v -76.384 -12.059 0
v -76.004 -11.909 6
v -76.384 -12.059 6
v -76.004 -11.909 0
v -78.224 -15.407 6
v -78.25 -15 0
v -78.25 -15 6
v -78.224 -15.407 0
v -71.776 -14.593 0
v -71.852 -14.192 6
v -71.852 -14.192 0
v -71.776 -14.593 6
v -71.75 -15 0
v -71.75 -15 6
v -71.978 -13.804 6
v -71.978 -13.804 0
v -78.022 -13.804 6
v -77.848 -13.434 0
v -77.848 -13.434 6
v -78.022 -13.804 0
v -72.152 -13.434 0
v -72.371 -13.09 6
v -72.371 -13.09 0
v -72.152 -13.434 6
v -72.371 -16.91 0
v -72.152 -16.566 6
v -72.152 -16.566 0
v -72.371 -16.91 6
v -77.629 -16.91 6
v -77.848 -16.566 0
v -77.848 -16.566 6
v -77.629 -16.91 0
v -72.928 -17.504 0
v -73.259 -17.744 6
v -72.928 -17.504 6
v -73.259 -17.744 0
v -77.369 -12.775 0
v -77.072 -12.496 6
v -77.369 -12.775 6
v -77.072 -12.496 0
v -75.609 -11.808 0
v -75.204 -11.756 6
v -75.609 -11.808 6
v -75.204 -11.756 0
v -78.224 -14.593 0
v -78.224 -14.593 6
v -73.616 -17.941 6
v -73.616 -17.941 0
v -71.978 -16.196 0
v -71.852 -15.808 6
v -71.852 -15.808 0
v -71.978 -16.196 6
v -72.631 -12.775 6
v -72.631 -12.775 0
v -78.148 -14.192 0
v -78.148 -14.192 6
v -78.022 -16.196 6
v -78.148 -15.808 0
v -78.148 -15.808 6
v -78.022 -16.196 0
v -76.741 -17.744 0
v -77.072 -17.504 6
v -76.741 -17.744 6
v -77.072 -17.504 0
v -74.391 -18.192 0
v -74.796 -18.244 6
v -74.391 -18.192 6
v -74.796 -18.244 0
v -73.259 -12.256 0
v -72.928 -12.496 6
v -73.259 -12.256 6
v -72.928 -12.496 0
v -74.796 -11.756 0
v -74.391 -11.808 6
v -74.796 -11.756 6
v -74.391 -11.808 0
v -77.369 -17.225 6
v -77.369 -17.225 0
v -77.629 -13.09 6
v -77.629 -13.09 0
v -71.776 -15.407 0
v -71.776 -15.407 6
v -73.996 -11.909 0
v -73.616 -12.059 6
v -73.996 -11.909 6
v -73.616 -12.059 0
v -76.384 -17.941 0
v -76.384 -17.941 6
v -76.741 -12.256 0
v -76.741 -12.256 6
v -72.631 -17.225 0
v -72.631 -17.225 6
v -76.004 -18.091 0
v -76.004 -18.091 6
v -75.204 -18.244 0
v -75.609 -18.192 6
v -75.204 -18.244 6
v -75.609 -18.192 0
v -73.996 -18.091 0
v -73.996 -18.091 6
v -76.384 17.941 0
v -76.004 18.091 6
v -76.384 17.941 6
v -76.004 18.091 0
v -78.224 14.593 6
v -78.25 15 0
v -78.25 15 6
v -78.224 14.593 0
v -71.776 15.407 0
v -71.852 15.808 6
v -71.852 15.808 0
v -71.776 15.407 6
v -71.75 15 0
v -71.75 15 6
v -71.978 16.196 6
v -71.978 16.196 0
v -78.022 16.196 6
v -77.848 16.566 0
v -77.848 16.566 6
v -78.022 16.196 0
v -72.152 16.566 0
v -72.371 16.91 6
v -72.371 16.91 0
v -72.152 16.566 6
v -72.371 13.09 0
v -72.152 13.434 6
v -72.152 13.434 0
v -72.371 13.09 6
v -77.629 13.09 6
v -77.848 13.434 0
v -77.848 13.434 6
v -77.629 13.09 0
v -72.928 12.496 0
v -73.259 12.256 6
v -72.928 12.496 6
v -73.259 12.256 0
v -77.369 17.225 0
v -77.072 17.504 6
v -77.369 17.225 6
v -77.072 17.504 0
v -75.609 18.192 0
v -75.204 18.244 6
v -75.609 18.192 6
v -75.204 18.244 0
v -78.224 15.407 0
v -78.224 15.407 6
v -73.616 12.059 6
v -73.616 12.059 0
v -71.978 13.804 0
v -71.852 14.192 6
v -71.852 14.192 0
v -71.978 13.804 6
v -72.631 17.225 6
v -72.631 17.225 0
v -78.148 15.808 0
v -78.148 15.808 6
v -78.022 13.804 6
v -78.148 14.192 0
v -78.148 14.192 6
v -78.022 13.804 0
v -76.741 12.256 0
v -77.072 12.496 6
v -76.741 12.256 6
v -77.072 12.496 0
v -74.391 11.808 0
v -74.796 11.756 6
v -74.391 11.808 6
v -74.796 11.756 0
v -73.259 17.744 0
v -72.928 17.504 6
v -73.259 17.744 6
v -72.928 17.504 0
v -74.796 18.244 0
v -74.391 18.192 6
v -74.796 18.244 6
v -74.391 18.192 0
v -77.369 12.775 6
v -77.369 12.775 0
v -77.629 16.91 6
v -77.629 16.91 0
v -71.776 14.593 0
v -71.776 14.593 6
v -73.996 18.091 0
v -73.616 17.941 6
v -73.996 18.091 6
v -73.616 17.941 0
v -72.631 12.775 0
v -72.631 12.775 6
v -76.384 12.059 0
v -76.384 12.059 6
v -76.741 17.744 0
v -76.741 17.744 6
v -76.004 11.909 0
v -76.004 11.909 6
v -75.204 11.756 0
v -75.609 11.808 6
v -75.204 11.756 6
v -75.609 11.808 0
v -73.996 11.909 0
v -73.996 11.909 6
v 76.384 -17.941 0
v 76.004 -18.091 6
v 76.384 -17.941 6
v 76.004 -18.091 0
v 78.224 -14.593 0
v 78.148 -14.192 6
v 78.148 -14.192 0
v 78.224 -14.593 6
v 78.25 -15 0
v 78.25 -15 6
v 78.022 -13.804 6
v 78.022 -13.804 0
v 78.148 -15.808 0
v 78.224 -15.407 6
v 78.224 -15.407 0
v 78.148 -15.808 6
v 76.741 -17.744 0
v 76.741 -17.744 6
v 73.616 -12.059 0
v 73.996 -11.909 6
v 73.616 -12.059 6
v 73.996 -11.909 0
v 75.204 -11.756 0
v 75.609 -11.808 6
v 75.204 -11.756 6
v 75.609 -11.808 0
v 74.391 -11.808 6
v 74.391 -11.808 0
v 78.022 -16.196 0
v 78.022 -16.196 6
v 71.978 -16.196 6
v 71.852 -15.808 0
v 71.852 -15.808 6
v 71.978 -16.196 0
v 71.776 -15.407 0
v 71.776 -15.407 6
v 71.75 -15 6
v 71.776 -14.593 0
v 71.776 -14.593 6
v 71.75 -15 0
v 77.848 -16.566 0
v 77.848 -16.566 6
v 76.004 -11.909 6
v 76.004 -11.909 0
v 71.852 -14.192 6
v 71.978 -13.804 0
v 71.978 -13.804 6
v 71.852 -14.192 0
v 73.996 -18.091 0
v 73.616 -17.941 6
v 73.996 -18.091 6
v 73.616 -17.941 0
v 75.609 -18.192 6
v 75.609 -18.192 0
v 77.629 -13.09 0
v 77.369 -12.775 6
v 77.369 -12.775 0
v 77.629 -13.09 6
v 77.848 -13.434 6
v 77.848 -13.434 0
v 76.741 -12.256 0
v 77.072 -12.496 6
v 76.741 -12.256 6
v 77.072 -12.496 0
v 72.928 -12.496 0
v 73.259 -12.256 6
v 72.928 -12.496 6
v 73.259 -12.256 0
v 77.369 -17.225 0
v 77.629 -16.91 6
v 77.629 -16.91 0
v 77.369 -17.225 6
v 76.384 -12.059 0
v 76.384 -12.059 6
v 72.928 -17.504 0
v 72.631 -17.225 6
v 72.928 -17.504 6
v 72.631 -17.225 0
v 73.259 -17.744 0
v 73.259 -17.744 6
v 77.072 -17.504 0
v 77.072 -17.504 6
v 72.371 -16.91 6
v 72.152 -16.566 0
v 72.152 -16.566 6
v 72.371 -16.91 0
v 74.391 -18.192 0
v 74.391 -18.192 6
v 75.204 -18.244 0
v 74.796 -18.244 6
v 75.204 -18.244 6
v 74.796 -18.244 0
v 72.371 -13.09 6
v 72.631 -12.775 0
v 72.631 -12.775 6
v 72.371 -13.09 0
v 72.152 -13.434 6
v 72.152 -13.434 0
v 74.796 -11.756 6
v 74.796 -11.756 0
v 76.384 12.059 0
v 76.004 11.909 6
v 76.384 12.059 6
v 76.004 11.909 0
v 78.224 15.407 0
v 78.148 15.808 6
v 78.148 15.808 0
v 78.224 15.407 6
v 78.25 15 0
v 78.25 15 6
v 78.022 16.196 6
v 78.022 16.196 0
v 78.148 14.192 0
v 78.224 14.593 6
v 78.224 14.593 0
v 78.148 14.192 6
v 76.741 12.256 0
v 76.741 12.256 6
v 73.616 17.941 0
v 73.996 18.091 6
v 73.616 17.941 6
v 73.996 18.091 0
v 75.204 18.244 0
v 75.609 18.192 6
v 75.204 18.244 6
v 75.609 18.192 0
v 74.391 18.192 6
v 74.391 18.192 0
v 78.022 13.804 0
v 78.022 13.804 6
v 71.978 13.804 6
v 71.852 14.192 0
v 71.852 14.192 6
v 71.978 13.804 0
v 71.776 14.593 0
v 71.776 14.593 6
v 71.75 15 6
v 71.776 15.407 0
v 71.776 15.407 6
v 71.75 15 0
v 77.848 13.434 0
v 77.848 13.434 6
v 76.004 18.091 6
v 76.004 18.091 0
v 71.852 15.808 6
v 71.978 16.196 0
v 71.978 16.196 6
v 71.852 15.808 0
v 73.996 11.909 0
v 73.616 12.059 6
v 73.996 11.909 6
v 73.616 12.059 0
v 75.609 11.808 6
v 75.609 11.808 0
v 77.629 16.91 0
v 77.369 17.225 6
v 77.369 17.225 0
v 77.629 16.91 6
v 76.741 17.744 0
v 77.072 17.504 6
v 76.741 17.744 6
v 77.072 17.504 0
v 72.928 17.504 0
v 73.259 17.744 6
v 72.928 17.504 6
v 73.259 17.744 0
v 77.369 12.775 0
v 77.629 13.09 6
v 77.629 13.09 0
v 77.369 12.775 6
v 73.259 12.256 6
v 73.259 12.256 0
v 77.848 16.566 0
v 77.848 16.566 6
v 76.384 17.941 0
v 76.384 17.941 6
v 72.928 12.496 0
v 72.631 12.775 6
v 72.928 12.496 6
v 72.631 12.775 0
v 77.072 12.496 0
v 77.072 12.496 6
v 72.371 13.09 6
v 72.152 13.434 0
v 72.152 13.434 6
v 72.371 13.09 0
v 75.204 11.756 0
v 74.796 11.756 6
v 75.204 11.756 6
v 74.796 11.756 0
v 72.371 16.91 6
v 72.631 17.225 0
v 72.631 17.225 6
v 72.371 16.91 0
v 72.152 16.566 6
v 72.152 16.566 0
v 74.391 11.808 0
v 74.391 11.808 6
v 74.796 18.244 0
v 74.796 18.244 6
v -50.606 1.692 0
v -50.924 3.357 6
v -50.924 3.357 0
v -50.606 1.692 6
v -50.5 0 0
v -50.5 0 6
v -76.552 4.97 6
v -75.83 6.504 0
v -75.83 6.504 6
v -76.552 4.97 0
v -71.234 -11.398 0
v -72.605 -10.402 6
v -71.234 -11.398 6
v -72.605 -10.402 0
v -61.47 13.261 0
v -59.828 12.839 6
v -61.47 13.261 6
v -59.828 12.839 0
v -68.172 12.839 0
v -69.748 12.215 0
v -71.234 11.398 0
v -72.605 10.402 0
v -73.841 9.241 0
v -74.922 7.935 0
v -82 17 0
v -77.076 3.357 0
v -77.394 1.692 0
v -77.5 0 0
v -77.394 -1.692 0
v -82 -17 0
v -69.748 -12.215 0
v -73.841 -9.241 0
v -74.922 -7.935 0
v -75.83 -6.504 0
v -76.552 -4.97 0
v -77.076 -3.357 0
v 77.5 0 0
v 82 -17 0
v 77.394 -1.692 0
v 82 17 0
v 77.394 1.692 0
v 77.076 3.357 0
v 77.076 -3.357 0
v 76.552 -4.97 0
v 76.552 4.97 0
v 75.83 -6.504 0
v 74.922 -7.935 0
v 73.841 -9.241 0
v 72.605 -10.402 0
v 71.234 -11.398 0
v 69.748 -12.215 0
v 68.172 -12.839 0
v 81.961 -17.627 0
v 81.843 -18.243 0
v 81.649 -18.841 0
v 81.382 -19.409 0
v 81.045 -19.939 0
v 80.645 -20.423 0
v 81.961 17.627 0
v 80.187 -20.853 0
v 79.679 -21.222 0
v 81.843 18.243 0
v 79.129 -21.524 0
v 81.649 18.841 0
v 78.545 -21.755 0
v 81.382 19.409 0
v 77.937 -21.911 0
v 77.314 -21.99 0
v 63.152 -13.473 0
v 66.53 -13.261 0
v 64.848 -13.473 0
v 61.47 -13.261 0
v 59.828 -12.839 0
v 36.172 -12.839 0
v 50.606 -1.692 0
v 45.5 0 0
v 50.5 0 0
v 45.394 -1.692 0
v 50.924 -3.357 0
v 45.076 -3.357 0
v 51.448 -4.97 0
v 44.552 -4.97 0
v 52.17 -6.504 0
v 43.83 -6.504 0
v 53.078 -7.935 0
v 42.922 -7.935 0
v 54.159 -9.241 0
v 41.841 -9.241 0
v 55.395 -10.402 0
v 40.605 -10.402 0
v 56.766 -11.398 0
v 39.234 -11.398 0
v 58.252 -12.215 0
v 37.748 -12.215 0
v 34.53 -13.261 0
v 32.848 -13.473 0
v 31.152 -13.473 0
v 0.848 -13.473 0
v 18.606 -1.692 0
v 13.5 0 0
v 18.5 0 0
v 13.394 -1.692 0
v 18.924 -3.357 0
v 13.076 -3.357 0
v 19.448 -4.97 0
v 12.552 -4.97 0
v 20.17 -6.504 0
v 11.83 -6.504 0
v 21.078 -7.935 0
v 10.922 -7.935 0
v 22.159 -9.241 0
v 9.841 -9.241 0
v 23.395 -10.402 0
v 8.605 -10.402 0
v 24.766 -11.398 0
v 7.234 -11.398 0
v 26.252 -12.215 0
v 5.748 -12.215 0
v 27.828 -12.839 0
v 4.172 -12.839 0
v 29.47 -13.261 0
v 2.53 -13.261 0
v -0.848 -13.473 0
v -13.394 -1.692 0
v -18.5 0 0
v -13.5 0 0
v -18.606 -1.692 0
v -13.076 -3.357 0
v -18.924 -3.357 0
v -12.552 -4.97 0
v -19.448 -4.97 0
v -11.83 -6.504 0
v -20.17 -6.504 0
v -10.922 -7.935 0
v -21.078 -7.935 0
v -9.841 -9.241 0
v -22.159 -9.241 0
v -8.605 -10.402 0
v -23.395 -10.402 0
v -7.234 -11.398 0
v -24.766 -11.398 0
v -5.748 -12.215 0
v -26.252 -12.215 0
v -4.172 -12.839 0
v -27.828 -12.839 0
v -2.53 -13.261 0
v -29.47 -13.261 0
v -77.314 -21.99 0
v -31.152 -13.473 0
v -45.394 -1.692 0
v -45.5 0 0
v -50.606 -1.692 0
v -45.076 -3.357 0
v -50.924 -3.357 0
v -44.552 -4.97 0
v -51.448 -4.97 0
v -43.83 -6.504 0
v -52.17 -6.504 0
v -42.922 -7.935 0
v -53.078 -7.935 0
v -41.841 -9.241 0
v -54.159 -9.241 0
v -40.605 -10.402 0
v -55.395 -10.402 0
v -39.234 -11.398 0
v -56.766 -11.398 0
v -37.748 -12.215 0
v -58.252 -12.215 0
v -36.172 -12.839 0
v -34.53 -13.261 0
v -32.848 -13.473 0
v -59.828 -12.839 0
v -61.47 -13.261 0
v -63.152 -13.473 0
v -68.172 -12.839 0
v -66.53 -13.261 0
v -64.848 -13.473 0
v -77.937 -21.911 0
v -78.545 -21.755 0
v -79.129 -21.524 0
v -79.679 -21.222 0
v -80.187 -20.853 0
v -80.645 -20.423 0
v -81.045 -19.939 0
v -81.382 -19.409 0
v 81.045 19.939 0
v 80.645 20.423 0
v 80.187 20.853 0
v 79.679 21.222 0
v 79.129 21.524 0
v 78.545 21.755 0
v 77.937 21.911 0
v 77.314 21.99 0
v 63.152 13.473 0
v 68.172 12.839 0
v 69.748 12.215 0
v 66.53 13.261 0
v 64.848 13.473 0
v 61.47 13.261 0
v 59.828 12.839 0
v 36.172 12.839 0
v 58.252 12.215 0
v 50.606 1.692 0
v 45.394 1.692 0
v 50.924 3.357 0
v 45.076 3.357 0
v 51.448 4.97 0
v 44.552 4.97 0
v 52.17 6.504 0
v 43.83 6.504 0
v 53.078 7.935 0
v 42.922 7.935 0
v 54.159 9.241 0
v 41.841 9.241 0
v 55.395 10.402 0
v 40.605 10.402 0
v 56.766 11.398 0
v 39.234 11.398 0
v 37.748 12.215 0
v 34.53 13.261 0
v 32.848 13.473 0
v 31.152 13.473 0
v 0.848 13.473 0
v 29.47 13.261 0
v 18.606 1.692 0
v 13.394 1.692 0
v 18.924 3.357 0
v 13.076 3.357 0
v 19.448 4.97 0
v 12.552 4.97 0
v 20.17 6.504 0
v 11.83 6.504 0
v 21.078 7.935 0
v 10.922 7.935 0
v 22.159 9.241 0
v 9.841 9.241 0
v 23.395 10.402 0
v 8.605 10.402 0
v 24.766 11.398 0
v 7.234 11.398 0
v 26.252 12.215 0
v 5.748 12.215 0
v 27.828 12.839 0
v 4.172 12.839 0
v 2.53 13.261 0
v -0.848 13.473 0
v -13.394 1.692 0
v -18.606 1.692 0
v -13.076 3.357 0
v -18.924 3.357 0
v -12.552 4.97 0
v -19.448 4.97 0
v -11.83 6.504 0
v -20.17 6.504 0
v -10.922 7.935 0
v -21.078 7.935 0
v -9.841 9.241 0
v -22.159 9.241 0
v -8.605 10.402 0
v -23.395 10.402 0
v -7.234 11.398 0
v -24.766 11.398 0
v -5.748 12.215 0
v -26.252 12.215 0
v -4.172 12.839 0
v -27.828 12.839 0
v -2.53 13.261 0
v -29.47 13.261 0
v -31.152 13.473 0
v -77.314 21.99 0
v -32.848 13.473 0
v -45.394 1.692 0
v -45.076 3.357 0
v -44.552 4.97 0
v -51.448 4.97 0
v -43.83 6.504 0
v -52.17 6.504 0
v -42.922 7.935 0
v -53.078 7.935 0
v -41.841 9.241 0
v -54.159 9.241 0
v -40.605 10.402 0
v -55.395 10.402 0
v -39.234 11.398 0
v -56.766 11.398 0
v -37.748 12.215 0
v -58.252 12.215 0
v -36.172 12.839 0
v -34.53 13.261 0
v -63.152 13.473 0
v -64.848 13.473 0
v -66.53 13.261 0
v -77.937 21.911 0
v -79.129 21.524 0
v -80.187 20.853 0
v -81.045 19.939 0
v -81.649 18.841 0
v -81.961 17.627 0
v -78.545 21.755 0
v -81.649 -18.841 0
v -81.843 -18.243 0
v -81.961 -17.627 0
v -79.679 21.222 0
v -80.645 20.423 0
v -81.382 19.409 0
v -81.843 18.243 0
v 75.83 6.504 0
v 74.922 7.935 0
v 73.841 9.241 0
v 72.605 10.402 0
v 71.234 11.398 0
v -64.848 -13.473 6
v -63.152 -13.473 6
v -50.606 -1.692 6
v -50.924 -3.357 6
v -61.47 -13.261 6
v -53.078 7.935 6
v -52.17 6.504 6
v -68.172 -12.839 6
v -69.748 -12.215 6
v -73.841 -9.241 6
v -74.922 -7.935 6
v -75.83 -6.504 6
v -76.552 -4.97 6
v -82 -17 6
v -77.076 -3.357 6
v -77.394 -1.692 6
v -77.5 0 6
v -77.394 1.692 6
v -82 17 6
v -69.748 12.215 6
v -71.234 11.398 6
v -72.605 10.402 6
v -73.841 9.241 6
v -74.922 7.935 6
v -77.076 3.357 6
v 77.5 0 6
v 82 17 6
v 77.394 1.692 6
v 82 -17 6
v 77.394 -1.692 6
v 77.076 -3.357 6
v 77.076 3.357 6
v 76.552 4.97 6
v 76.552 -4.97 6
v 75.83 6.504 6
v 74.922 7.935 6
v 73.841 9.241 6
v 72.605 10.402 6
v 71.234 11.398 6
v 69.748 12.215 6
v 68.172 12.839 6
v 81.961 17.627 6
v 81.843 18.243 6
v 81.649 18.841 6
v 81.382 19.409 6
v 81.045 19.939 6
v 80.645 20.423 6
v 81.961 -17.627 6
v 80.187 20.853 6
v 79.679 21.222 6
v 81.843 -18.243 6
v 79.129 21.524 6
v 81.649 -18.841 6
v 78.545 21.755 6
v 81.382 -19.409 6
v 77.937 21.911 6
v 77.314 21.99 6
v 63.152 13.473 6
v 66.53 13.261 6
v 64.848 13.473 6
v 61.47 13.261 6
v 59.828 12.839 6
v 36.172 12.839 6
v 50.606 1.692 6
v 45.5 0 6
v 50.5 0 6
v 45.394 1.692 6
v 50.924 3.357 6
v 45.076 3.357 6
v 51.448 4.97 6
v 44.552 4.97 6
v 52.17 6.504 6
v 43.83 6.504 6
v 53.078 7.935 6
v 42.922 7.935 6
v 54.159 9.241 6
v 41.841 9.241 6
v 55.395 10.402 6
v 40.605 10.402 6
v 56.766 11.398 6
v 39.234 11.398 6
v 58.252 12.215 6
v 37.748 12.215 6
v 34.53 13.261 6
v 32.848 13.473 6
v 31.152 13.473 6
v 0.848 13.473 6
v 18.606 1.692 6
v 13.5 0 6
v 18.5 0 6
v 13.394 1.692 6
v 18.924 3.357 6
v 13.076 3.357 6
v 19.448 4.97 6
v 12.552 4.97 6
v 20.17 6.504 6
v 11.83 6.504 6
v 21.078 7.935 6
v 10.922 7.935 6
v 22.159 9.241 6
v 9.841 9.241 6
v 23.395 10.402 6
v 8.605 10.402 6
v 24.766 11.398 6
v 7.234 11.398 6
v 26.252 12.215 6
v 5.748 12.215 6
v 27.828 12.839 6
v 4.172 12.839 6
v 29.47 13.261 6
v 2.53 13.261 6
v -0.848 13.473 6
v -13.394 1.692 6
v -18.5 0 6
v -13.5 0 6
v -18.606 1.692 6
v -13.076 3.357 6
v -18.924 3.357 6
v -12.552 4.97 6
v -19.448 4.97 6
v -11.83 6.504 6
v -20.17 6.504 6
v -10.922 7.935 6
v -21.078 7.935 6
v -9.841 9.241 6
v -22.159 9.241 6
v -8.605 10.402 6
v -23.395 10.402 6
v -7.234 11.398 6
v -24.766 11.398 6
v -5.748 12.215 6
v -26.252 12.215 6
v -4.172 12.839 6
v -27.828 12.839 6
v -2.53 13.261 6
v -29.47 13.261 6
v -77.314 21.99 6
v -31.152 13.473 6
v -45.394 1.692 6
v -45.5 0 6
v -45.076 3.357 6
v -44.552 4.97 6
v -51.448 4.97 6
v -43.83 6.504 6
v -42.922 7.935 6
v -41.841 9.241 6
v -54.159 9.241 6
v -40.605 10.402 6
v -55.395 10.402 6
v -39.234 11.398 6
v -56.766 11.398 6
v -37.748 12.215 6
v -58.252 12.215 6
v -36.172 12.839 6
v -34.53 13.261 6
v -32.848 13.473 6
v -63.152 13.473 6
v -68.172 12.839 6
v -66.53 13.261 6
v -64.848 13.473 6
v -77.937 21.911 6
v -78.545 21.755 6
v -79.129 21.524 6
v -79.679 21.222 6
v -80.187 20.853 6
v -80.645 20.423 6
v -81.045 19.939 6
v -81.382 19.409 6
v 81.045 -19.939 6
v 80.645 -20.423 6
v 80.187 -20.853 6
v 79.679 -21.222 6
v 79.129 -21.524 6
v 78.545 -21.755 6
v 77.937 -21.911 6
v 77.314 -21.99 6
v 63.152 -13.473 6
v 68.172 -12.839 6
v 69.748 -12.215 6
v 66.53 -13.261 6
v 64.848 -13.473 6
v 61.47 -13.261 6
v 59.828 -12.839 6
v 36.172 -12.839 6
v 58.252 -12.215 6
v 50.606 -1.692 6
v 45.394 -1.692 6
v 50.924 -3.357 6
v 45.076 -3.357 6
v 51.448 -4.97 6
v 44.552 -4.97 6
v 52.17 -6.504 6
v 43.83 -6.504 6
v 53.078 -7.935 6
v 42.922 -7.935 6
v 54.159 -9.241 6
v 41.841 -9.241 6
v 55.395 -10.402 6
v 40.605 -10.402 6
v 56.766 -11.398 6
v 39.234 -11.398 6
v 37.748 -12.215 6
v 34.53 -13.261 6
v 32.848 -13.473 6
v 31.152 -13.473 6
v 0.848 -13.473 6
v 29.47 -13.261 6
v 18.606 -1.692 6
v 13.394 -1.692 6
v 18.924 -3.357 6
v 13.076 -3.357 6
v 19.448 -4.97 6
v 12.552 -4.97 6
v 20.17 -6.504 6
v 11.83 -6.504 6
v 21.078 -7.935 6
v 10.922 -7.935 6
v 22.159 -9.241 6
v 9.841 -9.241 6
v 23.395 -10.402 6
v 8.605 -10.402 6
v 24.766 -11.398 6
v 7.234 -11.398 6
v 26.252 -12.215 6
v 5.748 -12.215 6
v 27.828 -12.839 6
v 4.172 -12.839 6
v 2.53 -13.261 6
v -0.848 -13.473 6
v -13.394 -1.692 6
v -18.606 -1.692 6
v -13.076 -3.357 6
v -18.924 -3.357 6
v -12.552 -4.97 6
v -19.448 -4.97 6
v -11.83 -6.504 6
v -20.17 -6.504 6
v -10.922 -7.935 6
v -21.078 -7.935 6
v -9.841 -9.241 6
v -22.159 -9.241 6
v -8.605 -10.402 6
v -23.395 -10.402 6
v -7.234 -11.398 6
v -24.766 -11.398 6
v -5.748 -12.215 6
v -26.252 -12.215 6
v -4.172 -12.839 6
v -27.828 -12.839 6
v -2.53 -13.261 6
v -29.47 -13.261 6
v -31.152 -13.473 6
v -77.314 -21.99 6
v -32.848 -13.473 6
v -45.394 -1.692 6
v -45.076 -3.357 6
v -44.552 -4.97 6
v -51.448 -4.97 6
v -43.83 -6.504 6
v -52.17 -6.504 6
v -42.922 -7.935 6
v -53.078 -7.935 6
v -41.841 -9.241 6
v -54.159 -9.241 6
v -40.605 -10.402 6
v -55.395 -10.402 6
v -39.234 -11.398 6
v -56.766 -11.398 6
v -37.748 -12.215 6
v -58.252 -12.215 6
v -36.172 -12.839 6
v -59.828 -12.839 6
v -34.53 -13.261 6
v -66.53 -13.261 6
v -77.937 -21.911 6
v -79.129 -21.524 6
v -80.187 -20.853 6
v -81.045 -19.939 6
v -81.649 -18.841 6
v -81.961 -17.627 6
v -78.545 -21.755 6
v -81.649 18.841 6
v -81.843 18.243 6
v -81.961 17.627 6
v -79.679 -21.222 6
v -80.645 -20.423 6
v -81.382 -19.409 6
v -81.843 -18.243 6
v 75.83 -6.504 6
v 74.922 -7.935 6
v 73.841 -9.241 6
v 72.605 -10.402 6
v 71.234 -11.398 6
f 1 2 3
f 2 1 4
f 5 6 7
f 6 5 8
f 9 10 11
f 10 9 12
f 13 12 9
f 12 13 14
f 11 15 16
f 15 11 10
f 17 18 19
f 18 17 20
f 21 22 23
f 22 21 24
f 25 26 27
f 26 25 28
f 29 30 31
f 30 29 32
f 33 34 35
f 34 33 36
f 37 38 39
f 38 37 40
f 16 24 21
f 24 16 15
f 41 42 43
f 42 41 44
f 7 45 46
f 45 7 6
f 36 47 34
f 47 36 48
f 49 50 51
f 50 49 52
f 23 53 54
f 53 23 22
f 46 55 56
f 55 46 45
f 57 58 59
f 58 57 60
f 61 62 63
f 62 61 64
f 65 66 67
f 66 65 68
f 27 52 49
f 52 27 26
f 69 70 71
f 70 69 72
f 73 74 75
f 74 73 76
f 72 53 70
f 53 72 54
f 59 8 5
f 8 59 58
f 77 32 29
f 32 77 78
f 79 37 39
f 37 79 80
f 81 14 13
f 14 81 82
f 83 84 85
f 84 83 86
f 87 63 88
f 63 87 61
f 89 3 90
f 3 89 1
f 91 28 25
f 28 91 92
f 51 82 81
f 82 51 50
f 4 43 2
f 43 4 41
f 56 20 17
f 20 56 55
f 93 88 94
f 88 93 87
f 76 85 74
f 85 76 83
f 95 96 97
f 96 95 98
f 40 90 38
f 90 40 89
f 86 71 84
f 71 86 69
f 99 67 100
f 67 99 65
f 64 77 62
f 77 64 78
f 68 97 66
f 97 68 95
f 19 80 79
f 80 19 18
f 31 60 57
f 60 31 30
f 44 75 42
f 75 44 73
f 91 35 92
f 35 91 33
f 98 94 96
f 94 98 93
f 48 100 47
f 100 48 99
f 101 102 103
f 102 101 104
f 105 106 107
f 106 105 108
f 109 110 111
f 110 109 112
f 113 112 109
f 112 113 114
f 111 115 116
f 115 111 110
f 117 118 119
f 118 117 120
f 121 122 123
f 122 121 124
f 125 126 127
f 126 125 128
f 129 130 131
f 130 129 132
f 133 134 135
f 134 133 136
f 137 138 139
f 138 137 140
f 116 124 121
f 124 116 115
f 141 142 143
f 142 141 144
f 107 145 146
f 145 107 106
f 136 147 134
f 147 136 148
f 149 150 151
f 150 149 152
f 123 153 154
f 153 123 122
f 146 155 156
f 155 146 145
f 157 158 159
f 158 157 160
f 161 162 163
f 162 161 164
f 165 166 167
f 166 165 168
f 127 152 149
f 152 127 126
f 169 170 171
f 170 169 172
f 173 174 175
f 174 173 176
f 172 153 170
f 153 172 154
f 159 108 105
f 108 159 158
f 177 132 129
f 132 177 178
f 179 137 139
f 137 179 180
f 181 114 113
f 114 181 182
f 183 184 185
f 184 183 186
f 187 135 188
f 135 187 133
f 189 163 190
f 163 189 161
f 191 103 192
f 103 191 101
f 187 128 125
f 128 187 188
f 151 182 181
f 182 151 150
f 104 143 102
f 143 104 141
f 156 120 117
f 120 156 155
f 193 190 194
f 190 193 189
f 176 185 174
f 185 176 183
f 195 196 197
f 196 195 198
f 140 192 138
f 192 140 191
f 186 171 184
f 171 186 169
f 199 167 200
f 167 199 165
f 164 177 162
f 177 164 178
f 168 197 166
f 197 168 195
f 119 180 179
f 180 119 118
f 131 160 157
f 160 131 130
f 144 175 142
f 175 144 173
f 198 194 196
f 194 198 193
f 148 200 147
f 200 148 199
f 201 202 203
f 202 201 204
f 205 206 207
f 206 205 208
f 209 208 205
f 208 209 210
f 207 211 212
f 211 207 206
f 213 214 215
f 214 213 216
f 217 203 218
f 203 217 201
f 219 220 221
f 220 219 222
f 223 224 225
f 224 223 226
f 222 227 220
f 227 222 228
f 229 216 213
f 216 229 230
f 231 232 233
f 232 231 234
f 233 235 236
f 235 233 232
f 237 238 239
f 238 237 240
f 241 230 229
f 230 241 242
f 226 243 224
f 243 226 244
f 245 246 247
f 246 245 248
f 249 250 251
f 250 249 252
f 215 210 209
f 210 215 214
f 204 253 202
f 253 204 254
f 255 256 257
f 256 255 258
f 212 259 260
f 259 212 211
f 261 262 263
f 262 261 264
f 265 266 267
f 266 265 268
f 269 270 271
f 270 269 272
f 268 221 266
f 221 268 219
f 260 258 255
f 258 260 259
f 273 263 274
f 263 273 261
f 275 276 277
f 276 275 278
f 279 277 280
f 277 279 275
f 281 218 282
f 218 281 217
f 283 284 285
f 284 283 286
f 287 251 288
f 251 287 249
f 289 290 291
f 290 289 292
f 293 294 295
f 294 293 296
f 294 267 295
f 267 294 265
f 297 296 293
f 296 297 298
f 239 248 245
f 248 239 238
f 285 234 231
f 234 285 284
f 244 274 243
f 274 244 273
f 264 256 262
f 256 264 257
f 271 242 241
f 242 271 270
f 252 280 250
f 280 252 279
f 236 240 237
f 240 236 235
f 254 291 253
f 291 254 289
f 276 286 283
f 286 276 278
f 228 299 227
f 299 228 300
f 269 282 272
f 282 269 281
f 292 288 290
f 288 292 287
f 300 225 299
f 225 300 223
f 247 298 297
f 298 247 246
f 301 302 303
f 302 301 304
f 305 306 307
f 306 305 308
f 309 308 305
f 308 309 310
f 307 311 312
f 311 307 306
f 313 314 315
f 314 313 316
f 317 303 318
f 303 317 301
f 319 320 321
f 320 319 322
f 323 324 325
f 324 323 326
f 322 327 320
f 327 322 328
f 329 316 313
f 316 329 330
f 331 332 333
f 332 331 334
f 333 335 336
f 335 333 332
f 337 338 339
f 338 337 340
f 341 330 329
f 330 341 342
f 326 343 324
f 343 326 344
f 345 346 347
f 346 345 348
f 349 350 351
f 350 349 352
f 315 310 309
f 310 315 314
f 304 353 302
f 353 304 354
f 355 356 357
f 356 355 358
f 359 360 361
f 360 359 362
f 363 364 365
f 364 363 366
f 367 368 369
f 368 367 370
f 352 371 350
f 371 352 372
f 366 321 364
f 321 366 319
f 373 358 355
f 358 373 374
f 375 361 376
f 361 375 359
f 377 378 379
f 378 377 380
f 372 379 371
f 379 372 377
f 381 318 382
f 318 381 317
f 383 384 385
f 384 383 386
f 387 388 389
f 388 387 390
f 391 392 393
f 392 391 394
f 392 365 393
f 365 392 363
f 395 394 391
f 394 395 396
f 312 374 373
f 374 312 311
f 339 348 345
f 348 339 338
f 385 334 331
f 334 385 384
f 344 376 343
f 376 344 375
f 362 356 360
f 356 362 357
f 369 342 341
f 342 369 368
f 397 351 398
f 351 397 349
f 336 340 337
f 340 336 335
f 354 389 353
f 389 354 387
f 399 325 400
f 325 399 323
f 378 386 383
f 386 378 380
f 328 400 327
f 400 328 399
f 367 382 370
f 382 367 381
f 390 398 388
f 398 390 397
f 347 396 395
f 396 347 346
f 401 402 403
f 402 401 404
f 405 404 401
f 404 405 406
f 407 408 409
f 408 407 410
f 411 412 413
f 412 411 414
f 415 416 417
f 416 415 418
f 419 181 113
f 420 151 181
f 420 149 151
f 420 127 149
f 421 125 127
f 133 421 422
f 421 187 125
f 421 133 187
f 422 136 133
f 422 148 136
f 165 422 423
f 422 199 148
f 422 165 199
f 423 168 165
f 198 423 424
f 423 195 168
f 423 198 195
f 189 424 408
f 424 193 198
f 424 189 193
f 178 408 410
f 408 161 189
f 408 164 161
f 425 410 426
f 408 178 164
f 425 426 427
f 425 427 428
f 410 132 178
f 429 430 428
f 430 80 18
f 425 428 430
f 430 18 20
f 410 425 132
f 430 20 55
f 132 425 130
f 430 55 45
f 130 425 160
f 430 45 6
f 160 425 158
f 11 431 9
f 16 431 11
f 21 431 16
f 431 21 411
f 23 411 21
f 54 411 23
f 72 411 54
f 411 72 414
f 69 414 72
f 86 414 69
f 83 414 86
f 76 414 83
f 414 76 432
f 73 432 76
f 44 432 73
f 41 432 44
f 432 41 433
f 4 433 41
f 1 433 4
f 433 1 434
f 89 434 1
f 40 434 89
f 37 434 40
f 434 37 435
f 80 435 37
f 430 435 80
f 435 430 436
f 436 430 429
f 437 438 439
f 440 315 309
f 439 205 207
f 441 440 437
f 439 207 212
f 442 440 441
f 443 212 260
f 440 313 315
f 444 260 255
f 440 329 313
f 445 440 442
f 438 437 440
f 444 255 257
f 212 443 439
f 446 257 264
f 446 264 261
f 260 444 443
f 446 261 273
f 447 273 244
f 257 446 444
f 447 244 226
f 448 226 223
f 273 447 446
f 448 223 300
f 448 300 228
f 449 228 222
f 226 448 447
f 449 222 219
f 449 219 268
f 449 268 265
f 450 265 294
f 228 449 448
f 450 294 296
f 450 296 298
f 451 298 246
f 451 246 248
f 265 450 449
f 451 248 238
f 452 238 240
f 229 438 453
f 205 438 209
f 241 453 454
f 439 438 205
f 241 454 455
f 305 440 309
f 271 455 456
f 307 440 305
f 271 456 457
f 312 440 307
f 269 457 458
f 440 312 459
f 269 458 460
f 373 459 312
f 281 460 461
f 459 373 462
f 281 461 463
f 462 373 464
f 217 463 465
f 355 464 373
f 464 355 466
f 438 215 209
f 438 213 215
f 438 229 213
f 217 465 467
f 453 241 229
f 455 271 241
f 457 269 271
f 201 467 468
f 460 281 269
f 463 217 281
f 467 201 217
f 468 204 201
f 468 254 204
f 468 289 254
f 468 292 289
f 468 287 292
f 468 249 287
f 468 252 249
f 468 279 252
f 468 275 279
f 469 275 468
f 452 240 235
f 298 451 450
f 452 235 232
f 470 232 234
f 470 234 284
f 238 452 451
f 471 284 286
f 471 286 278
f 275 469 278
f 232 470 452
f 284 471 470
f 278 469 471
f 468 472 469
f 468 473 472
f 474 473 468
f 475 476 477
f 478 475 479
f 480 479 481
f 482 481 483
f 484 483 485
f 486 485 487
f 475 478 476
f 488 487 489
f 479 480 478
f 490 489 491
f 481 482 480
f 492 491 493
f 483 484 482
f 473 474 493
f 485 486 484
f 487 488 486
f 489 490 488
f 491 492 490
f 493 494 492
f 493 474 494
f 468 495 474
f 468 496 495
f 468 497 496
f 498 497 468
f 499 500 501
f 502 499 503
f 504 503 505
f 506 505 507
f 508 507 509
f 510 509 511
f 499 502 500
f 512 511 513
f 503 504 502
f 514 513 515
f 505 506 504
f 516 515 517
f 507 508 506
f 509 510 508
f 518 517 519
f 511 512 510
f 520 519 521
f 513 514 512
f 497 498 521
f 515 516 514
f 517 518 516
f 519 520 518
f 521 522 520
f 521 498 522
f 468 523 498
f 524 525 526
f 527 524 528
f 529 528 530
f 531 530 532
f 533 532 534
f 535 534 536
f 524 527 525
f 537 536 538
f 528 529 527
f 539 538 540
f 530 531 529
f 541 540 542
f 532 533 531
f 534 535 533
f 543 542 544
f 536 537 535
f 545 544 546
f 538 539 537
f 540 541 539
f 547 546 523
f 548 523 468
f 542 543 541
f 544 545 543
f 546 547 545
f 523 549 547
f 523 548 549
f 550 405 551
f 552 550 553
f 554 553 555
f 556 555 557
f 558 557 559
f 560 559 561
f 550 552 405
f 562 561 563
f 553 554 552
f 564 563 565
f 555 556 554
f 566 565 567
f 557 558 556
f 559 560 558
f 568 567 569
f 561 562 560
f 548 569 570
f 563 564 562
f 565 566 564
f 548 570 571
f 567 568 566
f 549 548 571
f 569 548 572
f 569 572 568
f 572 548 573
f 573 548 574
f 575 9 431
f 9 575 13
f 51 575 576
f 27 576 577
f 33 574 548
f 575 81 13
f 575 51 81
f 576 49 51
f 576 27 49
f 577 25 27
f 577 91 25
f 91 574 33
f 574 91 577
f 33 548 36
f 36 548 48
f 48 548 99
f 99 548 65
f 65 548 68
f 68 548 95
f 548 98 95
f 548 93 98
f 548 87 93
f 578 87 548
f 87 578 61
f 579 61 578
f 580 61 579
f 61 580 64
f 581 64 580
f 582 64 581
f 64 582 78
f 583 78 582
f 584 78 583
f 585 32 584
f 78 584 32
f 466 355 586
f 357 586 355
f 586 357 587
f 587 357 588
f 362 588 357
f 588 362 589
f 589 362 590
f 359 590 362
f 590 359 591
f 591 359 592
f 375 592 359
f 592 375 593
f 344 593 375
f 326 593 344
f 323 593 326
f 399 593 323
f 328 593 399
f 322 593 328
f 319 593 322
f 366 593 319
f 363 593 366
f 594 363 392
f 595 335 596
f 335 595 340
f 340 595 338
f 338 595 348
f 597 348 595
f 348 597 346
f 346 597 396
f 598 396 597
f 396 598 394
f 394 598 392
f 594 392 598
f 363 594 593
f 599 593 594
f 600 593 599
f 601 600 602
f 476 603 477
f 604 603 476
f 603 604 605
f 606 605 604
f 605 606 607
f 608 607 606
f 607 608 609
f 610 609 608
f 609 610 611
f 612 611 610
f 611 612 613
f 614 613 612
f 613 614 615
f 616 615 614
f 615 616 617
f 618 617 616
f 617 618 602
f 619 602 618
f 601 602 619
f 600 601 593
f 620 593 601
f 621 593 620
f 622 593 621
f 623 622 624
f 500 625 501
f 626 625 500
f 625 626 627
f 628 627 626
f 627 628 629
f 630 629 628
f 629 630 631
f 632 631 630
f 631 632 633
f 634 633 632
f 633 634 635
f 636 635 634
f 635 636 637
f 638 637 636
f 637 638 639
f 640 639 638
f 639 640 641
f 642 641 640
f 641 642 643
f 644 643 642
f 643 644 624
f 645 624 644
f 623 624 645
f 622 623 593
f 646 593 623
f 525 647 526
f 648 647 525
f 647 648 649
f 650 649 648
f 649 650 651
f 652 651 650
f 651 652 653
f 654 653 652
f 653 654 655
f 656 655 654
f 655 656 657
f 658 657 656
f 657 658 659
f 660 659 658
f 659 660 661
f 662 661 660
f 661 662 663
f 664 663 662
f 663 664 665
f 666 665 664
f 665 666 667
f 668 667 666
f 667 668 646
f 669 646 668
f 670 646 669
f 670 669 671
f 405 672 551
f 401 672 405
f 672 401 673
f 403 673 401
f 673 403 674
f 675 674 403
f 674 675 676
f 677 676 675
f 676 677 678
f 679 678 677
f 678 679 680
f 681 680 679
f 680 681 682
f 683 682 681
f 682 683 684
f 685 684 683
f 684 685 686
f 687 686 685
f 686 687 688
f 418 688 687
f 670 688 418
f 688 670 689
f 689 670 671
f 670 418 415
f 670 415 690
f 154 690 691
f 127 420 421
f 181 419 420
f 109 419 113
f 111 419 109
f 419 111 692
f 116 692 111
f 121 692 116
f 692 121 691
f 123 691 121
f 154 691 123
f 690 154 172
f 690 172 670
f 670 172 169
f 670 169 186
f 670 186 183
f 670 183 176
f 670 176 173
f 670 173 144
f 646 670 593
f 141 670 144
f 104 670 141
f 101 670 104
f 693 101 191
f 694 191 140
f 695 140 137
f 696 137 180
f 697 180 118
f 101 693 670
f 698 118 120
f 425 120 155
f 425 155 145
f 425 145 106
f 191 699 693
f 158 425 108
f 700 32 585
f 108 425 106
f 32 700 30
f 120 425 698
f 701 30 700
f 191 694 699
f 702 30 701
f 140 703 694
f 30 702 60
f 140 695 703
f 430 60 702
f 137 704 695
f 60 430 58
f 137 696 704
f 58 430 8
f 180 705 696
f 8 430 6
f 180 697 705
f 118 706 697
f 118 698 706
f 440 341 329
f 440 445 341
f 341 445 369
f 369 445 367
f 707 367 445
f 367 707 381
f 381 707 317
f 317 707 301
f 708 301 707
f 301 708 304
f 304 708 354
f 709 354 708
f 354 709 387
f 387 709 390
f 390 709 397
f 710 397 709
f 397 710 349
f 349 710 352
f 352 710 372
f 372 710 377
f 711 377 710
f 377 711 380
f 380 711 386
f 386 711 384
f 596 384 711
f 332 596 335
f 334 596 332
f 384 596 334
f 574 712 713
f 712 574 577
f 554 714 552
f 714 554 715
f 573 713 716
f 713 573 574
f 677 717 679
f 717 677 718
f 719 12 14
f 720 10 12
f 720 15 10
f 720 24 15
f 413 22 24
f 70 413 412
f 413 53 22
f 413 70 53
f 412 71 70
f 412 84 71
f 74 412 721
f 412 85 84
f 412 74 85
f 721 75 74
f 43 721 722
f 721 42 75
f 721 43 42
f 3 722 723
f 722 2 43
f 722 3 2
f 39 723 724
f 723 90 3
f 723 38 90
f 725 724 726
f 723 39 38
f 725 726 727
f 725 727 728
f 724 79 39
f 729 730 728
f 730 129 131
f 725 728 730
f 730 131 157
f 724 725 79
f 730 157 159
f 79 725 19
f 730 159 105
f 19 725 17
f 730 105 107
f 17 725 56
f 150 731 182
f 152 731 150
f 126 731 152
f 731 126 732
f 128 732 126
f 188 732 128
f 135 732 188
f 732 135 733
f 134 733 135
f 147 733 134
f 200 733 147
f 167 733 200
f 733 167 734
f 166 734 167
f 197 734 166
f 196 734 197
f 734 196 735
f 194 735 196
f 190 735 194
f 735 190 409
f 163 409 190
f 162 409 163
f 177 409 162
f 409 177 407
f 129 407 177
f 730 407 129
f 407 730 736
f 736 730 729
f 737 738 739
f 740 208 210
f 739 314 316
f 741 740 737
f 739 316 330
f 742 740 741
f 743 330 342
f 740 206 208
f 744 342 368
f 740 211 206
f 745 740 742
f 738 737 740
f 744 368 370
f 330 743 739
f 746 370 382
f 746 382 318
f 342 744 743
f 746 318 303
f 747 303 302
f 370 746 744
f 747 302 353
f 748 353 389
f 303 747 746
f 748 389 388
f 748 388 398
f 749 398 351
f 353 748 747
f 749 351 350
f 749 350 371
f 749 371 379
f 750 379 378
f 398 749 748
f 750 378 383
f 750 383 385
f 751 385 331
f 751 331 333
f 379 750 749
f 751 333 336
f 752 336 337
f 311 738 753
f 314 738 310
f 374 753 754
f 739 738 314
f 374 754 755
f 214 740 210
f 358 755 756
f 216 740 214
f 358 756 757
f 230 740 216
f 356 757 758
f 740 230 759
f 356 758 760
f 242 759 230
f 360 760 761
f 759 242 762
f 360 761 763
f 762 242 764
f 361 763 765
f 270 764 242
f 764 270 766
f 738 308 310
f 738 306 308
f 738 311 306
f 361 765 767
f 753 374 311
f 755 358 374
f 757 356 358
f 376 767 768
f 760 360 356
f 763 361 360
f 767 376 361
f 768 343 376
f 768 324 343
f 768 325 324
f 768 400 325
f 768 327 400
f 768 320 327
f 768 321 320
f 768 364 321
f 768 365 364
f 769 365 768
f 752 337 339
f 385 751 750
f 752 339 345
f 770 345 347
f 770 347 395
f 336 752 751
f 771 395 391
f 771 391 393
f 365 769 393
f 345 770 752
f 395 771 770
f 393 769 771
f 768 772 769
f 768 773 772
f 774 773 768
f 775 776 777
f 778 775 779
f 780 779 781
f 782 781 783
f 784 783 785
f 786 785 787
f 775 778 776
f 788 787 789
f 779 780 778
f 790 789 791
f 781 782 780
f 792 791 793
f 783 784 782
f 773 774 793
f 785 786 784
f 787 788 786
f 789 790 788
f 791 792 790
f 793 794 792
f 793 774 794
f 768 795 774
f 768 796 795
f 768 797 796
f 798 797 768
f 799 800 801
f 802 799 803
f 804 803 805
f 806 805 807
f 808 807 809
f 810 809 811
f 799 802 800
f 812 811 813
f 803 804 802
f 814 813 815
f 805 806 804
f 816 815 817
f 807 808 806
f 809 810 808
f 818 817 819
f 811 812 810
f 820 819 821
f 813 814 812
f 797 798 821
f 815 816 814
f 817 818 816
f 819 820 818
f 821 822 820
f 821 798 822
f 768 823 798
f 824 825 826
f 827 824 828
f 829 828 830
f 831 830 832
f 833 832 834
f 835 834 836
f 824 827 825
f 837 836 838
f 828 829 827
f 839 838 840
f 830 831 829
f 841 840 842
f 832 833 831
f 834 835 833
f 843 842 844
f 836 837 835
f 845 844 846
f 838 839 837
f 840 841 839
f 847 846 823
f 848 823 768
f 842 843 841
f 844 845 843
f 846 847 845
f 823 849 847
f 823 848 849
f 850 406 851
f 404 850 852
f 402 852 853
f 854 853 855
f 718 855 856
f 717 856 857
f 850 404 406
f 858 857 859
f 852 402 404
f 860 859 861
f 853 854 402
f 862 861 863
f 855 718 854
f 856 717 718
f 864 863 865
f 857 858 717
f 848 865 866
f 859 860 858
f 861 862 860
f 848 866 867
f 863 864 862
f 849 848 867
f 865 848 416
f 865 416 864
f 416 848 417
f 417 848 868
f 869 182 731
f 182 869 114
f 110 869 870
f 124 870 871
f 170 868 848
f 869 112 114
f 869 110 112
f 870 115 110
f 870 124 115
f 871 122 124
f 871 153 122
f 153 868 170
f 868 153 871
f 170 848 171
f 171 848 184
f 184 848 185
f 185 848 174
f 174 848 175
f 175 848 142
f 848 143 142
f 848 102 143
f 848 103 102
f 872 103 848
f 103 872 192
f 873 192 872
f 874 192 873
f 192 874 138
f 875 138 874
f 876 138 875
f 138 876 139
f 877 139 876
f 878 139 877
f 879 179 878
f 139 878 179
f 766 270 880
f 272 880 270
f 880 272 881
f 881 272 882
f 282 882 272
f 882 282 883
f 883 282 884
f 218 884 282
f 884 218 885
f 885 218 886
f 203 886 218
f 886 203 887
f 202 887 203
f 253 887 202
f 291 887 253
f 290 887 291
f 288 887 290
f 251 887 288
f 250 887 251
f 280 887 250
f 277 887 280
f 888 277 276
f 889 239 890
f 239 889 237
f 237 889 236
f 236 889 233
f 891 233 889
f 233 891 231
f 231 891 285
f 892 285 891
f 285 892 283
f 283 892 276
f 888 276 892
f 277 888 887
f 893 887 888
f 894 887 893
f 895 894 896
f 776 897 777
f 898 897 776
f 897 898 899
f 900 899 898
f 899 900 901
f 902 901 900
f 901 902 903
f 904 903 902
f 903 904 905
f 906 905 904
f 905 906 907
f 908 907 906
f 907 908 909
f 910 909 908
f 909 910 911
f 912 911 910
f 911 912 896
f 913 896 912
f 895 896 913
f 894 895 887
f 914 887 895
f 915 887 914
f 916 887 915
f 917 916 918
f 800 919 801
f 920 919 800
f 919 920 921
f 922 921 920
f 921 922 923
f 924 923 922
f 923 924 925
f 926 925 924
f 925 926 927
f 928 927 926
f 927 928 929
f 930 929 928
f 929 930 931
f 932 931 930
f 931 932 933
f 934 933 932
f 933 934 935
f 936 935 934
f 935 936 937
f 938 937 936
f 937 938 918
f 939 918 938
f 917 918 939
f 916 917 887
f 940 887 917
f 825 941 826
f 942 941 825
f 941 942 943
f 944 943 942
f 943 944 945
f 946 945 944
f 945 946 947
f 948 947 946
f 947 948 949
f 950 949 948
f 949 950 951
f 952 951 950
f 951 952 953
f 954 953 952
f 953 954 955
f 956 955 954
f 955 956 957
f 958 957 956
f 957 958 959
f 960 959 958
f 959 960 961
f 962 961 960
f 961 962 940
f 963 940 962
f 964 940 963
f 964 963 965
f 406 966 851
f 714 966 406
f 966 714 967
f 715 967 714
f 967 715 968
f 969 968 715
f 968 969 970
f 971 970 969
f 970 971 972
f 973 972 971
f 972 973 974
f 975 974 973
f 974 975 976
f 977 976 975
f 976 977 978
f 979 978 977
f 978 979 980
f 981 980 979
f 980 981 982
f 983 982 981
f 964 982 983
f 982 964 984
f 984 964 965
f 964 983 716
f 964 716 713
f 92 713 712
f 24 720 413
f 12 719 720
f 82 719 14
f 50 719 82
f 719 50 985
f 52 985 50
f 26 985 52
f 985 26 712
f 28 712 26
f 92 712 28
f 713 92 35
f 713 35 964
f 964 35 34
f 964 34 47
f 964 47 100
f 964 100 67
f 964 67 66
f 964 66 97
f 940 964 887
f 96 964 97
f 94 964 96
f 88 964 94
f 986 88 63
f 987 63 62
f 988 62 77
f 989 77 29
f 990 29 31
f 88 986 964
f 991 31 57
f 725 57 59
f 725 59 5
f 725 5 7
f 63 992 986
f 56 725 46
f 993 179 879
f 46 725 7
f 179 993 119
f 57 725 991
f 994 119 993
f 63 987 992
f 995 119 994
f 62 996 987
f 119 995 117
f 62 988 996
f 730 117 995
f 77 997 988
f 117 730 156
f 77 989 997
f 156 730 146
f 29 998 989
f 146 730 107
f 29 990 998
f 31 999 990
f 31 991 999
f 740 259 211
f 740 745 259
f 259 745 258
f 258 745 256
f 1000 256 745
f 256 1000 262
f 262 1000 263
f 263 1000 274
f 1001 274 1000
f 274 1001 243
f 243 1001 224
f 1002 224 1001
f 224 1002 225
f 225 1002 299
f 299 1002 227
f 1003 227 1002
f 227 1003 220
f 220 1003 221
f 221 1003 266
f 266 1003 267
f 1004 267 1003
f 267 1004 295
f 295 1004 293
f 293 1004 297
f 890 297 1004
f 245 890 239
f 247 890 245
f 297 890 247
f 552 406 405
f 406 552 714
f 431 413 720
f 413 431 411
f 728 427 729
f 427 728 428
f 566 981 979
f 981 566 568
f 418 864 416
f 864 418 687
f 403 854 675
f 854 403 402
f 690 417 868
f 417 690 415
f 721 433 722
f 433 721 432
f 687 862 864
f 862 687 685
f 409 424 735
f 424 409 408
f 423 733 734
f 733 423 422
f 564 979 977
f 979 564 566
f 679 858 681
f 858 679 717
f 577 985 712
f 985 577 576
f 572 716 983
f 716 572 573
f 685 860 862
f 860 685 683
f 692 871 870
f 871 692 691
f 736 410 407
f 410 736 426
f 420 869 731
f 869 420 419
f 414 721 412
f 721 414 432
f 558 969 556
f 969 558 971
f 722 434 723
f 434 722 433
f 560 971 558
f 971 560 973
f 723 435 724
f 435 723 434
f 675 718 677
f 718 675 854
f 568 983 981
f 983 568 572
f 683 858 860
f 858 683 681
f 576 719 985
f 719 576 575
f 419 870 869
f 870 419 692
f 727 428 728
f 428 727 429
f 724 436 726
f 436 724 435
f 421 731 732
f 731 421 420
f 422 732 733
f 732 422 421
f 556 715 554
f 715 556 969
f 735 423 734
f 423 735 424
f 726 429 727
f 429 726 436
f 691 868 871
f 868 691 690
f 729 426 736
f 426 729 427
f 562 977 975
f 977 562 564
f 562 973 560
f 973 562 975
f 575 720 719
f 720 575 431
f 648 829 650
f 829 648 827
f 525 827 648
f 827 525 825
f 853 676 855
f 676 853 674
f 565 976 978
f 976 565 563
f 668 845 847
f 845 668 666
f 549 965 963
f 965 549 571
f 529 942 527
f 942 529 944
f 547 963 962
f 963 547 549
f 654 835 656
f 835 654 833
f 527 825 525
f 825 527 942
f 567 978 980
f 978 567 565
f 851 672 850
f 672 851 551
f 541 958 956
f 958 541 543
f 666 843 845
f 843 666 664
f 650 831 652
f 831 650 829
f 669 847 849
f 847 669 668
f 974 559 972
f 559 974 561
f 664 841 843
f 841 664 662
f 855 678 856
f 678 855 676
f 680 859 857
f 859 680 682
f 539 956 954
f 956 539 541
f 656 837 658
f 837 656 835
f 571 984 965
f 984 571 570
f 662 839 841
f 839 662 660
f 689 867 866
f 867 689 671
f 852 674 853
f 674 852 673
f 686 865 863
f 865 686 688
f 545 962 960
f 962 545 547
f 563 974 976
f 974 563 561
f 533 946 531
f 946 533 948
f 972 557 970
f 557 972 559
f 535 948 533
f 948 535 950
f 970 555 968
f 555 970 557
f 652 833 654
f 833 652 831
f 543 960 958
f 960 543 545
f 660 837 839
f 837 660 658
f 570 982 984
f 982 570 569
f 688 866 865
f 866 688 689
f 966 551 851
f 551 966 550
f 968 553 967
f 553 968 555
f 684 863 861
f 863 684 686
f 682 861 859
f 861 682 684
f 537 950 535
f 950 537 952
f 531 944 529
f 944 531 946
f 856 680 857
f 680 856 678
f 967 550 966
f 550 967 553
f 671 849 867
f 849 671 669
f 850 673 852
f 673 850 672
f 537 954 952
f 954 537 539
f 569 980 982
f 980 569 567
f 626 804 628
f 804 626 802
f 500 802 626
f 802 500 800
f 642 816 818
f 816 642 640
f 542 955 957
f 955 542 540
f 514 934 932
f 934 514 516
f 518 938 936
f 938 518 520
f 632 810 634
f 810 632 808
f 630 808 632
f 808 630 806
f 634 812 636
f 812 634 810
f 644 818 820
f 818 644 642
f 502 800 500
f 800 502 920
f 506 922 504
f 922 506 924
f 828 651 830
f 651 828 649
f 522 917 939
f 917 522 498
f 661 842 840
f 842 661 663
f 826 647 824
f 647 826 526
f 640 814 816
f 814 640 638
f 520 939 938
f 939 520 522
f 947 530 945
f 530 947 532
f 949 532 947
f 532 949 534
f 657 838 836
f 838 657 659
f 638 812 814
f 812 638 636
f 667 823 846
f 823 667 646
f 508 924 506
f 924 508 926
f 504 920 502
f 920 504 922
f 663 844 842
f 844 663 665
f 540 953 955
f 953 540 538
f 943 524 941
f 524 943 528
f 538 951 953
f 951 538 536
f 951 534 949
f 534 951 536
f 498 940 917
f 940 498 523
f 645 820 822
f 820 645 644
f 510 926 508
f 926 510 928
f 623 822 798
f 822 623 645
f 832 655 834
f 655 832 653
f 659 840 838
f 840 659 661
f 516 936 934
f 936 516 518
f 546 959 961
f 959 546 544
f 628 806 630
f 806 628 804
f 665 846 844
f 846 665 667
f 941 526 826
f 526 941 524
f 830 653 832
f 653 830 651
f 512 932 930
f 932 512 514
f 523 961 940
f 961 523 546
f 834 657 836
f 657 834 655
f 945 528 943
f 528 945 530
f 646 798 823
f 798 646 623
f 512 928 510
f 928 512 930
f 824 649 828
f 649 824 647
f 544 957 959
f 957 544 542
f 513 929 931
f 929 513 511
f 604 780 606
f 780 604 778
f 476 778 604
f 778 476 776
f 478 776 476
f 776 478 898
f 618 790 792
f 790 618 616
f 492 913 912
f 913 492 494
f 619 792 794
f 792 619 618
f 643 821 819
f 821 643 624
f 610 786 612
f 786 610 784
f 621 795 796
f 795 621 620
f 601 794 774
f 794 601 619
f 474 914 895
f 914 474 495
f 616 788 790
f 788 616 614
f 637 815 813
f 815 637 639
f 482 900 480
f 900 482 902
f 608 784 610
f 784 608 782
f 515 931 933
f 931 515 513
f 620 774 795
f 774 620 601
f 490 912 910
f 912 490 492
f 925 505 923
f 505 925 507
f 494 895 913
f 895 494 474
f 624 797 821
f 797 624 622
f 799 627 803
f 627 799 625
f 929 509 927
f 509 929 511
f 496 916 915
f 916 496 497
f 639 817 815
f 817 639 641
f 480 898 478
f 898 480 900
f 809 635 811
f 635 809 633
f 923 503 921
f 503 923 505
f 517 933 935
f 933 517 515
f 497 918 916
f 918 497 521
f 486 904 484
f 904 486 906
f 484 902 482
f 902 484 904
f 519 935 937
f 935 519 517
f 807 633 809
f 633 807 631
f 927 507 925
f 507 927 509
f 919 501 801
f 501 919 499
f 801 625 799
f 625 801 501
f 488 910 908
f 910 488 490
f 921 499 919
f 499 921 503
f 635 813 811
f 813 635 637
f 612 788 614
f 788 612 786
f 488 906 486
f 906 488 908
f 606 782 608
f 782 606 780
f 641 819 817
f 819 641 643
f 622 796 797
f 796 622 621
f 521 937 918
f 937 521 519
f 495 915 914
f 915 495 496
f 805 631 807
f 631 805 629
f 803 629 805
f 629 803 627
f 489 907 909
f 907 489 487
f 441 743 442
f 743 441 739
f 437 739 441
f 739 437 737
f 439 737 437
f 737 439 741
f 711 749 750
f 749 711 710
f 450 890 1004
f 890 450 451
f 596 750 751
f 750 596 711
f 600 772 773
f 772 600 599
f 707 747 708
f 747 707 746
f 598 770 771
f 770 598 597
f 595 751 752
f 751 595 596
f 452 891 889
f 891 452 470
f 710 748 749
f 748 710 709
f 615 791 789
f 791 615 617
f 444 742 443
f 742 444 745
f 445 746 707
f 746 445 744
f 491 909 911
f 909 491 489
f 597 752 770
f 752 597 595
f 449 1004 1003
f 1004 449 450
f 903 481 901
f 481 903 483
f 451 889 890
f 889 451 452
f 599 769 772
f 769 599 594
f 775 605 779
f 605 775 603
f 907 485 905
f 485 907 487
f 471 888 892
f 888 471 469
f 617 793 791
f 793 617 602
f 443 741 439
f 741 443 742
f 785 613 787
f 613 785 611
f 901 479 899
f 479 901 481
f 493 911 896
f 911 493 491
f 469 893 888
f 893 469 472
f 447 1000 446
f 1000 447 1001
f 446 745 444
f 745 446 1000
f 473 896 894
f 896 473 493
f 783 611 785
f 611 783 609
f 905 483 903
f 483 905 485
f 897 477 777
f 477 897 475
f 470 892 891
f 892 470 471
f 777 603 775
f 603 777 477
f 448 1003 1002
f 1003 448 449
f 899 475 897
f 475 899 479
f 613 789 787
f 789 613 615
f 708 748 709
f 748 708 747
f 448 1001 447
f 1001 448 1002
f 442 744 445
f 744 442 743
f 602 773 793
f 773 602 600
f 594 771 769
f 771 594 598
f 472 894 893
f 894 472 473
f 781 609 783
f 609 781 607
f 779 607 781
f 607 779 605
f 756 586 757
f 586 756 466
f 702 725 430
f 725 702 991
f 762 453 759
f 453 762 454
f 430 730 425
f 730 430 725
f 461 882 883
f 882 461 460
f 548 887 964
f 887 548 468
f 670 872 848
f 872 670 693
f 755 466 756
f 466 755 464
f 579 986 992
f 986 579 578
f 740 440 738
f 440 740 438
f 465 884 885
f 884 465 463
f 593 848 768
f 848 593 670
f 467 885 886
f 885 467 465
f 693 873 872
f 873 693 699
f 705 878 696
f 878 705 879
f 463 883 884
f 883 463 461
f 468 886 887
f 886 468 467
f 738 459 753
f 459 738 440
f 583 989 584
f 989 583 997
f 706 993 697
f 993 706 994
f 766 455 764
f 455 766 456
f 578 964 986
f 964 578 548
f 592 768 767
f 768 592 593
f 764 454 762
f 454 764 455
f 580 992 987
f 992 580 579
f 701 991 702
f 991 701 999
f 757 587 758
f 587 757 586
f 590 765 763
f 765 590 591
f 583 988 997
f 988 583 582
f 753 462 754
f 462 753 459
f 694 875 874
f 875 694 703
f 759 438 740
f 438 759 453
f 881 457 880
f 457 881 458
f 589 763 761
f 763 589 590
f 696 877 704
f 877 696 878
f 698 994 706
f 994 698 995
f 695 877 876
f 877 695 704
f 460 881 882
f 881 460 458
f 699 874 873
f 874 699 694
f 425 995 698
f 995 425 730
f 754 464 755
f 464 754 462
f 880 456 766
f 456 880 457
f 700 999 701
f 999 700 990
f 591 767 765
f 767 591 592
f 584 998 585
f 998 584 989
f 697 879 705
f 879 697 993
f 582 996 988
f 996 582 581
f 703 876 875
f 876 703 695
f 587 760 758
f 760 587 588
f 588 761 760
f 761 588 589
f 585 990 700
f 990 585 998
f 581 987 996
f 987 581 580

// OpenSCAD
$fn = 50;

difference() {
	union() {
		hull() {
			translate(v = [-77.0, 17.0, 0]) {
				cylinder(h = 6, r = 5);
			}
			translate(v = [77.0, 17.0, 0]) {
				cylinder(h = 6, r = 5);
			}
			translate(v = [-77.0, -17.0, 0]) {
				cylinder(h = 6, r = 5);
			}
			translate(v = [77.0, -17.0, 0]) {
				cylinder(h = 6, r = 5);
			}
		}
	}
	union() {
		translate(v = [-75.0, -15.0, -100.0]) {
			cylinder(h = 200, r = 3.25);
		}
		translate(v = [-75.0, 15.0, -100.0]) {
			cylinder(h = 200, r = 3.25);
		}
		translate(v = [75.0, -15.0, -100.0]) {
			cylinder(h = 200, r = 3.25);
		}
		translate(v = [75.0, 15.0, -100.0]) {
			cylinder(h = 200, r = 3.25);
		}
		translate(v = [-75.0, -15.0, -100.0]) {
			cylinder(h = 200, r = 1.8);
		}
		translate(v = [-75.0, 15.0, -100.0]) {
			cylinder(h = 200, r = 1.8);
		}
		translate(v = [75.0, -15.0, -100.0]) {
			cylinder(h = 200, r = 1.8);
		}
		translate(v = [75.0, 15.0, -100.0]) {
			cylinder(h = 200, r = 1.8);
		}
		translate(v = [-64.0, 0, 0.0]) {
			cylinder(h = 6, r = 13.5);
		}
		translate(v = [-32.0, 0, 0.0]) {
			cylinder(h = 6, r = 13.5);
		}
		cylinder(h = 6, r = 13.5);
		translate(v = [32.0, 0, 0.0]) {
			cylinder(h = 6, r = 13.5);
		}
		translate(v = [64.0, 0, 0.0]) {
			cylinder(h = 6, r = 13.5);
		}
	}
}
